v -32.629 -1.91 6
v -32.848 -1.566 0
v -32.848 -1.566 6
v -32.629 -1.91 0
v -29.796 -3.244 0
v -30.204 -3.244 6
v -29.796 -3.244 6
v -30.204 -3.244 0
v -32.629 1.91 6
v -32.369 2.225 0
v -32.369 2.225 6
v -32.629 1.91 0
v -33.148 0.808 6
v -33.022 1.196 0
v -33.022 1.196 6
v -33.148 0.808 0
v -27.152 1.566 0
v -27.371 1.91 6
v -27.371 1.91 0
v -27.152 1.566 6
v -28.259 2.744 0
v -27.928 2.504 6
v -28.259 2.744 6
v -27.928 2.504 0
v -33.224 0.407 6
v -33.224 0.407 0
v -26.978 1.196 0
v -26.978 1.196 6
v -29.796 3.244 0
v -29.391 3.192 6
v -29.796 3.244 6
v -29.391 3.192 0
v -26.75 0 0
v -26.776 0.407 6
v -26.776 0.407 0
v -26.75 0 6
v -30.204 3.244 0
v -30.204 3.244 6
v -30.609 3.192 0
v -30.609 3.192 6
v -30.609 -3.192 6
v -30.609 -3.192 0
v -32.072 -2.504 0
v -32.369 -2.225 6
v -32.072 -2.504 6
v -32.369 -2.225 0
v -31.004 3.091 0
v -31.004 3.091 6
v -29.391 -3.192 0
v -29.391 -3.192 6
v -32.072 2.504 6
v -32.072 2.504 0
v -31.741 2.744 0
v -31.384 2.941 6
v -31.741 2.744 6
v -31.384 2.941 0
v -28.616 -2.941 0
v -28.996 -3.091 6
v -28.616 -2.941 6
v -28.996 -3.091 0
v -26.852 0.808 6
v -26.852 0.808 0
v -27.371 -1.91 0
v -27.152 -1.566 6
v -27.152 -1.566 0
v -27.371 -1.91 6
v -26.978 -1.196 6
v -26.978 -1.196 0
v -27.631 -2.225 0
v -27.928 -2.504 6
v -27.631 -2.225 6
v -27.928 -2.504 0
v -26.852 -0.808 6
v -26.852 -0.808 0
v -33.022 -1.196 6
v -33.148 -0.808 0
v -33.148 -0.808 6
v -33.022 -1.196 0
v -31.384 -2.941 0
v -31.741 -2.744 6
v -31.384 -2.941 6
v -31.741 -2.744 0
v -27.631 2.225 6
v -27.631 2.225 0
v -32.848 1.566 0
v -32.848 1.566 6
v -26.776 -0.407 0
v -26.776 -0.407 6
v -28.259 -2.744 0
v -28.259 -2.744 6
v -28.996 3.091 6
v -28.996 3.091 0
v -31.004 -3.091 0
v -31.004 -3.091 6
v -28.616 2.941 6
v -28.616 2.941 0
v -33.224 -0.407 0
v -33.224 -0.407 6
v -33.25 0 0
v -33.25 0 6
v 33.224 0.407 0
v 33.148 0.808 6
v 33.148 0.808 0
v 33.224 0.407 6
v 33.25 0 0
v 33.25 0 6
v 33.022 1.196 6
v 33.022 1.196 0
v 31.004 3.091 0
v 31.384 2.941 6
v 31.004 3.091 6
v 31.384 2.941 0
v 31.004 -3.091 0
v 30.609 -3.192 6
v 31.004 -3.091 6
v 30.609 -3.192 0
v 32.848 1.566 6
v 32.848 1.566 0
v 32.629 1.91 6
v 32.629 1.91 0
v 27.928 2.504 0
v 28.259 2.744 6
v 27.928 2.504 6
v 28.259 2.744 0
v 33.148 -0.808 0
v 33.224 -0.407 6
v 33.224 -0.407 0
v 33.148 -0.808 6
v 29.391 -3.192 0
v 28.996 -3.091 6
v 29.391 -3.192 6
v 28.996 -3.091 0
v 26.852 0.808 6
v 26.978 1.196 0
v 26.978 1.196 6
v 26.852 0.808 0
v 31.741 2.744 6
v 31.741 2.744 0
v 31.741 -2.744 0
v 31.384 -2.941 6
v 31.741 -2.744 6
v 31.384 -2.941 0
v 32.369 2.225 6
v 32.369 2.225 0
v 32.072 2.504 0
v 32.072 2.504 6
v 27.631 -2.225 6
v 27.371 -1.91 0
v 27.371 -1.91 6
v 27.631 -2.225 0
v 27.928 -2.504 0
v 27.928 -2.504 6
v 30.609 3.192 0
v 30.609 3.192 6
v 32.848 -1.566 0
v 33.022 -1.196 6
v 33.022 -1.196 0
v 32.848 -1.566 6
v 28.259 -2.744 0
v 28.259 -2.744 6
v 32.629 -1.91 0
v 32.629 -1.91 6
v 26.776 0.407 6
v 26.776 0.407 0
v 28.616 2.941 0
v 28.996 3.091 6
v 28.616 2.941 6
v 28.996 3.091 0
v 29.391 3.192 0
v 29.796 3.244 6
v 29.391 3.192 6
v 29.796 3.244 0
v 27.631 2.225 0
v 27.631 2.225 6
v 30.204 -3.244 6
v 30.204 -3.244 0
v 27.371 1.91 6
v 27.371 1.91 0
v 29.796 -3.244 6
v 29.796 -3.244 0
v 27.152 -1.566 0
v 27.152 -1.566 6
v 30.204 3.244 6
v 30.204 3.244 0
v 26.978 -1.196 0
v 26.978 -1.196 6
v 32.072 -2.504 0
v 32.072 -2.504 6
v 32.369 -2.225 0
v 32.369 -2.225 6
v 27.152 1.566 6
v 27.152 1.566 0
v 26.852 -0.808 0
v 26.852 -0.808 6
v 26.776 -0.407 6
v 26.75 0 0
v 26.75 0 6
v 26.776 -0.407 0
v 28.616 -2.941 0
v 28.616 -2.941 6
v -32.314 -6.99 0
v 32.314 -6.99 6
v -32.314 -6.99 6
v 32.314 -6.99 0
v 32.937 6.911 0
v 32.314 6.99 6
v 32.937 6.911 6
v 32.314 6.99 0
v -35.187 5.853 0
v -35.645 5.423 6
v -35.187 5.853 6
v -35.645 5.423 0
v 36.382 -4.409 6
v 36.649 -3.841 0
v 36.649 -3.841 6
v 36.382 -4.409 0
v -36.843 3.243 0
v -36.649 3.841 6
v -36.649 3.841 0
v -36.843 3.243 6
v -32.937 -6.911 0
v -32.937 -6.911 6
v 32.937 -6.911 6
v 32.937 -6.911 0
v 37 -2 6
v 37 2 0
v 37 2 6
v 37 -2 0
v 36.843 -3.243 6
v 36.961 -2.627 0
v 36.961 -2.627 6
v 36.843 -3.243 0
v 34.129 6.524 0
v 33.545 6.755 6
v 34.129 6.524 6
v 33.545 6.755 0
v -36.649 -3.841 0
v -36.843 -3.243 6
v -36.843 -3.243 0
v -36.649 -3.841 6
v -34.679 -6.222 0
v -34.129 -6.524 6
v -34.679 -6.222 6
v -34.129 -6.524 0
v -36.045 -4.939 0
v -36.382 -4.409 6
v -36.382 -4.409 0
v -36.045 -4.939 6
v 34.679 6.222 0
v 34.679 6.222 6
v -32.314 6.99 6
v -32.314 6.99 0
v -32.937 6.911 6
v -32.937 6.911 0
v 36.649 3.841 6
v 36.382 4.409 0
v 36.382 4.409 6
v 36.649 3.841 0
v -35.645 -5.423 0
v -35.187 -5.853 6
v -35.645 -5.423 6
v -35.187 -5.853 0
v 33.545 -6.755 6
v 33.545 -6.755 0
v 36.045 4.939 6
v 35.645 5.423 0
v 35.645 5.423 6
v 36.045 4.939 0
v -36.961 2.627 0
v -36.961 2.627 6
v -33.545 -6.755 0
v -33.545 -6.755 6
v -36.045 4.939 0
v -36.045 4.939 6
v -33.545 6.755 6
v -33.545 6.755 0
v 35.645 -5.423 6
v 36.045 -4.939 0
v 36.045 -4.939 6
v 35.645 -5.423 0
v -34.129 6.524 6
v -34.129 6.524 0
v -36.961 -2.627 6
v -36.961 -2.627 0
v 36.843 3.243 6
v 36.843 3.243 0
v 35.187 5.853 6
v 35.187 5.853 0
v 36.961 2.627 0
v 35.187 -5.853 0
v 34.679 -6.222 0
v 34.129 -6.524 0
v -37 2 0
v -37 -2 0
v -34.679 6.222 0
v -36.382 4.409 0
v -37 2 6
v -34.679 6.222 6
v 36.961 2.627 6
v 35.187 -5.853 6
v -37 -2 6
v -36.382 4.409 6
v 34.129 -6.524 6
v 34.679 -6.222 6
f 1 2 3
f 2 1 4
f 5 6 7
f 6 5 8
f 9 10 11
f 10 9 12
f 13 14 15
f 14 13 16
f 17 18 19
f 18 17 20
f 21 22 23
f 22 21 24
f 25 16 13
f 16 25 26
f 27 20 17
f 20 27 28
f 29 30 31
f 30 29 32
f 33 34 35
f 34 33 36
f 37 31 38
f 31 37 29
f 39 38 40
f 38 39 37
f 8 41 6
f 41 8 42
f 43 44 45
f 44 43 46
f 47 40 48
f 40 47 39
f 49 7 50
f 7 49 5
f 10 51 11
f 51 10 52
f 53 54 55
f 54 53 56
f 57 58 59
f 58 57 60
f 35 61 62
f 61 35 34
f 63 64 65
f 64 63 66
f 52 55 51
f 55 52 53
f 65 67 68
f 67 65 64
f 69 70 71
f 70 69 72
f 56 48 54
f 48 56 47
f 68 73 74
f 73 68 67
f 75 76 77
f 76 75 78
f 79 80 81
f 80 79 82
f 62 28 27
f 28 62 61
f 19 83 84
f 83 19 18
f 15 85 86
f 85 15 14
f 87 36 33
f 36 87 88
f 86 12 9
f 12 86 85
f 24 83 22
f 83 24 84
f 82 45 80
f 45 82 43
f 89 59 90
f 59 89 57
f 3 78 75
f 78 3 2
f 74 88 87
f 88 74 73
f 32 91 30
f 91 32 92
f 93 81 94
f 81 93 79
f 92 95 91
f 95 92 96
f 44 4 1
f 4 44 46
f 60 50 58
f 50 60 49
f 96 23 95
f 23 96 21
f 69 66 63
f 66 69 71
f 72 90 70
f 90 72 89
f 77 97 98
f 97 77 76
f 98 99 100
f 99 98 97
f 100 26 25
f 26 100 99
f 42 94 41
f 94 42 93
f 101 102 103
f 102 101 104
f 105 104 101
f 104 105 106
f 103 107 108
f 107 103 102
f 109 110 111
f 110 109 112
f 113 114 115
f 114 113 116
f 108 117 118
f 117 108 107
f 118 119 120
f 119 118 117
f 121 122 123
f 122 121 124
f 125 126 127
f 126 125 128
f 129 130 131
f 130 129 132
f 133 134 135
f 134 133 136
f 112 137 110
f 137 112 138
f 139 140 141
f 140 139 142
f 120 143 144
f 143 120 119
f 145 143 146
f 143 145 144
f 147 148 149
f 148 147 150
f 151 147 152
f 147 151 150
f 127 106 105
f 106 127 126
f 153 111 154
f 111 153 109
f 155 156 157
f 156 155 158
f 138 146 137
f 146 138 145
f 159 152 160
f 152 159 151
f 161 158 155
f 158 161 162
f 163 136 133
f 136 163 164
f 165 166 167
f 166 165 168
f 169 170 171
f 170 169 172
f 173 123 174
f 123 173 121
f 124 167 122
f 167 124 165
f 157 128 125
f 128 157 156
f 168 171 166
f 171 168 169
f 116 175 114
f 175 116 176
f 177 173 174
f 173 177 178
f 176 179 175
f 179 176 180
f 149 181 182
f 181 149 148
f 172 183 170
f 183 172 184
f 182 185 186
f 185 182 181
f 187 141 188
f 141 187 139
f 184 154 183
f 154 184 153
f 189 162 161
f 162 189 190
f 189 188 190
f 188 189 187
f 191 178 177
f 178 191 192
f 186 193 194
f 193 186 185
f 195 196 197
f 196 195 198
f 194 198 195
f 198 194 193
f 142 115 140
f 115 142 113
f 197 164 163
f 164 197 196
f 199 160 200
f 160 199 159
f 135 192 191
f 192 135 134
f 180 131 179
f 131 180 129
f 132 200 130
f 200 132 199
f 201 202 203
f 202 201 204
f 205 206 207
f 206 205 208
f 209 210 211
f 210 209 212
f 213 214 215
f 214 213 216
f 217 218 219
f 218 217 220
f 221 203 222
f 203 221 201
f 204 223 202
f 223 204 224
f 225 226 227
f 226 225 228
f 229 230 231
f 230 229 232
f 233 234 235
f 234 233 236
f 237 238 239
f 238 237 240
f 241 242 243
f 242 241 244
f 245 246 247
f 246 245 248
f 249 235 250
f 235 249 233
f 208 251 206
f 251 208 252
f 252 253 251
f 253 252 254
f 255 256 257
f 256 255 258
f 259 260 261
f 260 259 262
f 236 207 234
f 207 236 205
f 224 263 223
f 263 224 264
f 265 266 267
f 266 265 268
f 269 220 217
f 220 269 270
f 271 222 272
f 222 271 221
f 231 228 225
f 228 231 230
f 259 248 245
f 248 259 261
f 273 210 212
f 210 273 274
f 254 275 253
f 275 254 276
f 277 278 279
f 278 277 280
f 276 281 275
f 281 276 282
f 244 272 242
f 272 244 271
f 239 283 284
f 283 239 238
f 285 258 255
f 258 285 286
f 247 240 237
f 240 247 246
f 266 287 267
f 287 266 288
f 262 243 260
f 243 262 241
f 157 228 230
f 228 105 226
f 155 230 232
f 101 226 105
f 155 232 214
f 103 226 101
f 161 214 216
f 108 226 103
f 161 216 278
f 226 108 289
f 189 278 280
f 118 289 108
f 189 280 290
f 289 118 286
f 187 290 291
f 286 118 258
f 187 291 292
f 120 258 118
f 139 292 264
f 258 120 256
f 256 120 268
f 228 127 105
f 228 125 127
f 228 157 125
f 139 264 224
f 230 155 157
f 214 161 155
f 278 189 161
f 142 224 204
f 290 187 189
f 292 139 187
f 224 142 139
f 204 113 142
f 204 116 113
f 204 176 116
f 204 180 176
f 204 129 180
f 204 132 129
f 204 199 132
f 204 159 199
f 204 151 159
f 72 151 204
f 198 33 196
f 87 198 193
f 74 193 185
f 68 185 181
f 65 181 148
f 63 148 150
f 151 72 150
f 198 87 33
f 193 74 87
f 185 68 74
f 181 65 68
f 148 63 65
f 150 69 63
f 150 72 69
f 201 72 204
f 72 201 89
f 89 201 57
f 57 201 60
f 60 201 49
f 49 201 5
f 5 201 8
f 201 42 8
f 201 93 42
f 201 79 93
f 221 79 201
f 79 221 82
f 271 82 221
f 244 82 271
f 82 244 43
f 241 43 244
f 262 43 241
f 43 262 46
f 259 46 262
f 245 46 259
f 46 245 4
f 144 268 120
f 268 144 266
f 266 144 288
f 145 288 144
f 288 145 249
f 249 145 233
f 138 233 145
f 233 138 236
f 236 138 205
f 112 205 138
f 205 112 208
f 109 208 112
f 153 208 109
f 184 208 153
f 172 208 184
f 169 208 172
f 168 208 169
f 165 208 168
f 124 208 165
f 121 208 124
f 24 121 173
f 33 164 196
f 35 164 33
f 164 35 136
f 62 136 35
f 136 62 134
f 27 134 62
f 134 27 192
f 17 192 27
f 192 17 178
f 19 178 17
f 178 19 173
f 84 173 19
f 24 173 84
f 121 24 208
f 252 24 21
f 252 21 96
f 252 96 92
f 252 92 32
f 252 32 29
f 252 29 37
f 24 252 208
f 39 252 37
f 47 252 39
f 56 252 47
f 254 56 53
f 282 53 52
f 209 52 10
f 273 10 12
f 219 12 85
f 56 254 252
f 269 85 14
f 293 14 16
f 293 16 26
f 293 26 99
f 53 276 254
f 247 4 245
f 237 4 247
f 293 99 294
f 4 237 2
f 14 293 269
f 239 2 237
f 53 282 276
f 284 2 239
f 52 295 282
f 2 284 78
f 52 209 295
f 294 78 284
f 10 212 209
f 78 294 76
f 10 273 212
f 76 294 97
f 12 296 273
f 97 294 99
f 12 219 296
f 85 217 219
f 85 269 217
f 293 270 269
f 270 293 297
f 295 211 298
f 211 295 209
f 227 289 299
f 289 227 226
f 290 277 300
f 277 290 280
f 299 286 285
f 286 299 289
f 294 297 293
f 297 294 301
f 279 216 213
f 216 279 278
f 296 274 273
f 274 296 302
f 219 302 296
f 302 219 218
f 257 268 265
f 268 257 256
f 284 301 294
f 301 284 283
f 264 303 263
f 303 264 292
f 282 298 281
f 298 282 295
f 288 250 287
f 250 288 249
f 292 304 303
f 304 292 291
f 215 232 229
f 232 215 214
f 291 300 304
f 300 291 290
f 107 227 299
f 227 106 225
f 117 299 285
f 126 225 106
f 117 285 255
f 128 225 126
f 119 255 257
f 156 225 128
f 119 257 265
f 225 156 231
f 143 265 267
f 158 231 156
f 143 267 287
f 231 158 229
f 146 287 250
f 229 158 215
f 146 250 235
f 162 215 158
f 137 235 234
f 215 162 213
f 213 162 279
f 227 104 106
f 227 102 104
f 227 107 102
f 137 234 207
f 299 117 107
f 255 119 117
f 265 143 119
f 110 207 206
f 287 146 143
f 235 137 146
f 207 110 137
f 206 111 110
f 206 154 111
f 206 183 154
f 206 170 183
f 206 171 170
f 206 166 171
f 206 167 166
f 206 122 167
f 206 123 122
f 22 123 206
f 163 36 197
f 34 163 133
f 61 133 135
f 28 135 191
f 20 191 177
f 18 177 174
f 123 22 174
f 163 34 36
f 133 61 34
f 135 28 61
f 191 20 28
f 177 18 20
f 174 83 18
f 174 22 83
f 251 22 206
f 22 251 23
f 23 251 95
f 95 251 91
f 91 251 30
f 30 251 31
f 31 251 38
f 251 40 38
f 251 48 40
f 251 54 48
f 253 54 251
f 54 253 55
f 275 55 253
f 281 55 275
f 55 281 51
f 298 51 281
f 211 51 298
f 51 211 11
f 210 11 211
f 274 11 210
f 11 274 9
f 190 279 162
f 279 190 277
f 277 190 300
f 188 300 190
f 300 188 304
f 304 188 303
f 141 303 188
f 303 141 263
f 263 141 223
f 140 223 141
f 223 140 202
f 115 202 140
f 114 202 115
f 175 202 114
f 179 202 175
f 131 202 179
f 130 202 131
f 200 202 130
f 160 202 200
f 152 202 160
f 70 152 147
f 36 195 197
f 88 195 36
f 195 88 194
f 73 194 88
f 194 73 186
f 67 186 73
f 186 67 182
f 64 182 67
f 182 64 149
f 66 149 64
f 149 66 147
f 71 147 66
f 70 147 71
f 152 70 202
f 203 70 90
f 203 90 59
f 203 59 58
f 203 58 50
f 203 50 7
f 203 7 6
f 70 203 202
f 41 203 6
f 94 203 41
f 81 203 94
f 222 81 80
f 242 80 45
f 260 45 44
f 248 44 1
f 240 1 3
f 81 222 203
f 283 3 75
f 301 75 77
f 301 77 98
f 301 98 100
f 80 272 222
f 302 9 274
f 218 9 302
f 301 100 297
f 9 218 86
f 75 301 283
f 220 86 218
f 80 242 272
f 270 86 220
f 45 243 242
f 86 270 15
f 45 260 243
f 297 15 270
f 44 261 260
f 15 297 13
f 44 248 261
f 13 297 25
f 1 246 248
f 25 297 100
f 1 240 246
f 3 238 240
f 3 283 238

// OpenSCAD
$fn = 50;


difference() {
	union() {
		hull() {
			translate(v = [-32.0000000000, 2.0000000000, 0]) {
				cylinder(h = 6, r = 5);
			}
			translate(v = [32.0000000000, 2.0000000000, 0]) {
				cylinder(h = 6, r = 5);
			}
			translate(v = [-32.0000000000, -2.0000000000, 0]) {
				cylinder(h = 6, r = 5);
			}
			translate(v = [32.0000000000, -2.0000000000, 0]) {
				cylinder(h = 6, r = 5);
			}
		}
	}
	union() {
		translate(v = [-30.0000000000, 0.0000000000, -100.0000000000]) {
			cylinder(h = 200, r = 3.2500000000);
		}
		translate(v = [-30.0000000000, 0.0000000000, -100.0000000000]) {
			cylinder(h = 200, r = 3.2500000000);
		}
		translate(v = [30.0000000000, 0.0000000000, -100.0000000000]) {
			cylinder(h = 200, r = 3.2500000000);
		}
		translate(v = [30.0000000000, 0.0000000000, -100.0000000000]) {
			cylinder(h = 200, r = 3.2500000000);
		}
	}
}
